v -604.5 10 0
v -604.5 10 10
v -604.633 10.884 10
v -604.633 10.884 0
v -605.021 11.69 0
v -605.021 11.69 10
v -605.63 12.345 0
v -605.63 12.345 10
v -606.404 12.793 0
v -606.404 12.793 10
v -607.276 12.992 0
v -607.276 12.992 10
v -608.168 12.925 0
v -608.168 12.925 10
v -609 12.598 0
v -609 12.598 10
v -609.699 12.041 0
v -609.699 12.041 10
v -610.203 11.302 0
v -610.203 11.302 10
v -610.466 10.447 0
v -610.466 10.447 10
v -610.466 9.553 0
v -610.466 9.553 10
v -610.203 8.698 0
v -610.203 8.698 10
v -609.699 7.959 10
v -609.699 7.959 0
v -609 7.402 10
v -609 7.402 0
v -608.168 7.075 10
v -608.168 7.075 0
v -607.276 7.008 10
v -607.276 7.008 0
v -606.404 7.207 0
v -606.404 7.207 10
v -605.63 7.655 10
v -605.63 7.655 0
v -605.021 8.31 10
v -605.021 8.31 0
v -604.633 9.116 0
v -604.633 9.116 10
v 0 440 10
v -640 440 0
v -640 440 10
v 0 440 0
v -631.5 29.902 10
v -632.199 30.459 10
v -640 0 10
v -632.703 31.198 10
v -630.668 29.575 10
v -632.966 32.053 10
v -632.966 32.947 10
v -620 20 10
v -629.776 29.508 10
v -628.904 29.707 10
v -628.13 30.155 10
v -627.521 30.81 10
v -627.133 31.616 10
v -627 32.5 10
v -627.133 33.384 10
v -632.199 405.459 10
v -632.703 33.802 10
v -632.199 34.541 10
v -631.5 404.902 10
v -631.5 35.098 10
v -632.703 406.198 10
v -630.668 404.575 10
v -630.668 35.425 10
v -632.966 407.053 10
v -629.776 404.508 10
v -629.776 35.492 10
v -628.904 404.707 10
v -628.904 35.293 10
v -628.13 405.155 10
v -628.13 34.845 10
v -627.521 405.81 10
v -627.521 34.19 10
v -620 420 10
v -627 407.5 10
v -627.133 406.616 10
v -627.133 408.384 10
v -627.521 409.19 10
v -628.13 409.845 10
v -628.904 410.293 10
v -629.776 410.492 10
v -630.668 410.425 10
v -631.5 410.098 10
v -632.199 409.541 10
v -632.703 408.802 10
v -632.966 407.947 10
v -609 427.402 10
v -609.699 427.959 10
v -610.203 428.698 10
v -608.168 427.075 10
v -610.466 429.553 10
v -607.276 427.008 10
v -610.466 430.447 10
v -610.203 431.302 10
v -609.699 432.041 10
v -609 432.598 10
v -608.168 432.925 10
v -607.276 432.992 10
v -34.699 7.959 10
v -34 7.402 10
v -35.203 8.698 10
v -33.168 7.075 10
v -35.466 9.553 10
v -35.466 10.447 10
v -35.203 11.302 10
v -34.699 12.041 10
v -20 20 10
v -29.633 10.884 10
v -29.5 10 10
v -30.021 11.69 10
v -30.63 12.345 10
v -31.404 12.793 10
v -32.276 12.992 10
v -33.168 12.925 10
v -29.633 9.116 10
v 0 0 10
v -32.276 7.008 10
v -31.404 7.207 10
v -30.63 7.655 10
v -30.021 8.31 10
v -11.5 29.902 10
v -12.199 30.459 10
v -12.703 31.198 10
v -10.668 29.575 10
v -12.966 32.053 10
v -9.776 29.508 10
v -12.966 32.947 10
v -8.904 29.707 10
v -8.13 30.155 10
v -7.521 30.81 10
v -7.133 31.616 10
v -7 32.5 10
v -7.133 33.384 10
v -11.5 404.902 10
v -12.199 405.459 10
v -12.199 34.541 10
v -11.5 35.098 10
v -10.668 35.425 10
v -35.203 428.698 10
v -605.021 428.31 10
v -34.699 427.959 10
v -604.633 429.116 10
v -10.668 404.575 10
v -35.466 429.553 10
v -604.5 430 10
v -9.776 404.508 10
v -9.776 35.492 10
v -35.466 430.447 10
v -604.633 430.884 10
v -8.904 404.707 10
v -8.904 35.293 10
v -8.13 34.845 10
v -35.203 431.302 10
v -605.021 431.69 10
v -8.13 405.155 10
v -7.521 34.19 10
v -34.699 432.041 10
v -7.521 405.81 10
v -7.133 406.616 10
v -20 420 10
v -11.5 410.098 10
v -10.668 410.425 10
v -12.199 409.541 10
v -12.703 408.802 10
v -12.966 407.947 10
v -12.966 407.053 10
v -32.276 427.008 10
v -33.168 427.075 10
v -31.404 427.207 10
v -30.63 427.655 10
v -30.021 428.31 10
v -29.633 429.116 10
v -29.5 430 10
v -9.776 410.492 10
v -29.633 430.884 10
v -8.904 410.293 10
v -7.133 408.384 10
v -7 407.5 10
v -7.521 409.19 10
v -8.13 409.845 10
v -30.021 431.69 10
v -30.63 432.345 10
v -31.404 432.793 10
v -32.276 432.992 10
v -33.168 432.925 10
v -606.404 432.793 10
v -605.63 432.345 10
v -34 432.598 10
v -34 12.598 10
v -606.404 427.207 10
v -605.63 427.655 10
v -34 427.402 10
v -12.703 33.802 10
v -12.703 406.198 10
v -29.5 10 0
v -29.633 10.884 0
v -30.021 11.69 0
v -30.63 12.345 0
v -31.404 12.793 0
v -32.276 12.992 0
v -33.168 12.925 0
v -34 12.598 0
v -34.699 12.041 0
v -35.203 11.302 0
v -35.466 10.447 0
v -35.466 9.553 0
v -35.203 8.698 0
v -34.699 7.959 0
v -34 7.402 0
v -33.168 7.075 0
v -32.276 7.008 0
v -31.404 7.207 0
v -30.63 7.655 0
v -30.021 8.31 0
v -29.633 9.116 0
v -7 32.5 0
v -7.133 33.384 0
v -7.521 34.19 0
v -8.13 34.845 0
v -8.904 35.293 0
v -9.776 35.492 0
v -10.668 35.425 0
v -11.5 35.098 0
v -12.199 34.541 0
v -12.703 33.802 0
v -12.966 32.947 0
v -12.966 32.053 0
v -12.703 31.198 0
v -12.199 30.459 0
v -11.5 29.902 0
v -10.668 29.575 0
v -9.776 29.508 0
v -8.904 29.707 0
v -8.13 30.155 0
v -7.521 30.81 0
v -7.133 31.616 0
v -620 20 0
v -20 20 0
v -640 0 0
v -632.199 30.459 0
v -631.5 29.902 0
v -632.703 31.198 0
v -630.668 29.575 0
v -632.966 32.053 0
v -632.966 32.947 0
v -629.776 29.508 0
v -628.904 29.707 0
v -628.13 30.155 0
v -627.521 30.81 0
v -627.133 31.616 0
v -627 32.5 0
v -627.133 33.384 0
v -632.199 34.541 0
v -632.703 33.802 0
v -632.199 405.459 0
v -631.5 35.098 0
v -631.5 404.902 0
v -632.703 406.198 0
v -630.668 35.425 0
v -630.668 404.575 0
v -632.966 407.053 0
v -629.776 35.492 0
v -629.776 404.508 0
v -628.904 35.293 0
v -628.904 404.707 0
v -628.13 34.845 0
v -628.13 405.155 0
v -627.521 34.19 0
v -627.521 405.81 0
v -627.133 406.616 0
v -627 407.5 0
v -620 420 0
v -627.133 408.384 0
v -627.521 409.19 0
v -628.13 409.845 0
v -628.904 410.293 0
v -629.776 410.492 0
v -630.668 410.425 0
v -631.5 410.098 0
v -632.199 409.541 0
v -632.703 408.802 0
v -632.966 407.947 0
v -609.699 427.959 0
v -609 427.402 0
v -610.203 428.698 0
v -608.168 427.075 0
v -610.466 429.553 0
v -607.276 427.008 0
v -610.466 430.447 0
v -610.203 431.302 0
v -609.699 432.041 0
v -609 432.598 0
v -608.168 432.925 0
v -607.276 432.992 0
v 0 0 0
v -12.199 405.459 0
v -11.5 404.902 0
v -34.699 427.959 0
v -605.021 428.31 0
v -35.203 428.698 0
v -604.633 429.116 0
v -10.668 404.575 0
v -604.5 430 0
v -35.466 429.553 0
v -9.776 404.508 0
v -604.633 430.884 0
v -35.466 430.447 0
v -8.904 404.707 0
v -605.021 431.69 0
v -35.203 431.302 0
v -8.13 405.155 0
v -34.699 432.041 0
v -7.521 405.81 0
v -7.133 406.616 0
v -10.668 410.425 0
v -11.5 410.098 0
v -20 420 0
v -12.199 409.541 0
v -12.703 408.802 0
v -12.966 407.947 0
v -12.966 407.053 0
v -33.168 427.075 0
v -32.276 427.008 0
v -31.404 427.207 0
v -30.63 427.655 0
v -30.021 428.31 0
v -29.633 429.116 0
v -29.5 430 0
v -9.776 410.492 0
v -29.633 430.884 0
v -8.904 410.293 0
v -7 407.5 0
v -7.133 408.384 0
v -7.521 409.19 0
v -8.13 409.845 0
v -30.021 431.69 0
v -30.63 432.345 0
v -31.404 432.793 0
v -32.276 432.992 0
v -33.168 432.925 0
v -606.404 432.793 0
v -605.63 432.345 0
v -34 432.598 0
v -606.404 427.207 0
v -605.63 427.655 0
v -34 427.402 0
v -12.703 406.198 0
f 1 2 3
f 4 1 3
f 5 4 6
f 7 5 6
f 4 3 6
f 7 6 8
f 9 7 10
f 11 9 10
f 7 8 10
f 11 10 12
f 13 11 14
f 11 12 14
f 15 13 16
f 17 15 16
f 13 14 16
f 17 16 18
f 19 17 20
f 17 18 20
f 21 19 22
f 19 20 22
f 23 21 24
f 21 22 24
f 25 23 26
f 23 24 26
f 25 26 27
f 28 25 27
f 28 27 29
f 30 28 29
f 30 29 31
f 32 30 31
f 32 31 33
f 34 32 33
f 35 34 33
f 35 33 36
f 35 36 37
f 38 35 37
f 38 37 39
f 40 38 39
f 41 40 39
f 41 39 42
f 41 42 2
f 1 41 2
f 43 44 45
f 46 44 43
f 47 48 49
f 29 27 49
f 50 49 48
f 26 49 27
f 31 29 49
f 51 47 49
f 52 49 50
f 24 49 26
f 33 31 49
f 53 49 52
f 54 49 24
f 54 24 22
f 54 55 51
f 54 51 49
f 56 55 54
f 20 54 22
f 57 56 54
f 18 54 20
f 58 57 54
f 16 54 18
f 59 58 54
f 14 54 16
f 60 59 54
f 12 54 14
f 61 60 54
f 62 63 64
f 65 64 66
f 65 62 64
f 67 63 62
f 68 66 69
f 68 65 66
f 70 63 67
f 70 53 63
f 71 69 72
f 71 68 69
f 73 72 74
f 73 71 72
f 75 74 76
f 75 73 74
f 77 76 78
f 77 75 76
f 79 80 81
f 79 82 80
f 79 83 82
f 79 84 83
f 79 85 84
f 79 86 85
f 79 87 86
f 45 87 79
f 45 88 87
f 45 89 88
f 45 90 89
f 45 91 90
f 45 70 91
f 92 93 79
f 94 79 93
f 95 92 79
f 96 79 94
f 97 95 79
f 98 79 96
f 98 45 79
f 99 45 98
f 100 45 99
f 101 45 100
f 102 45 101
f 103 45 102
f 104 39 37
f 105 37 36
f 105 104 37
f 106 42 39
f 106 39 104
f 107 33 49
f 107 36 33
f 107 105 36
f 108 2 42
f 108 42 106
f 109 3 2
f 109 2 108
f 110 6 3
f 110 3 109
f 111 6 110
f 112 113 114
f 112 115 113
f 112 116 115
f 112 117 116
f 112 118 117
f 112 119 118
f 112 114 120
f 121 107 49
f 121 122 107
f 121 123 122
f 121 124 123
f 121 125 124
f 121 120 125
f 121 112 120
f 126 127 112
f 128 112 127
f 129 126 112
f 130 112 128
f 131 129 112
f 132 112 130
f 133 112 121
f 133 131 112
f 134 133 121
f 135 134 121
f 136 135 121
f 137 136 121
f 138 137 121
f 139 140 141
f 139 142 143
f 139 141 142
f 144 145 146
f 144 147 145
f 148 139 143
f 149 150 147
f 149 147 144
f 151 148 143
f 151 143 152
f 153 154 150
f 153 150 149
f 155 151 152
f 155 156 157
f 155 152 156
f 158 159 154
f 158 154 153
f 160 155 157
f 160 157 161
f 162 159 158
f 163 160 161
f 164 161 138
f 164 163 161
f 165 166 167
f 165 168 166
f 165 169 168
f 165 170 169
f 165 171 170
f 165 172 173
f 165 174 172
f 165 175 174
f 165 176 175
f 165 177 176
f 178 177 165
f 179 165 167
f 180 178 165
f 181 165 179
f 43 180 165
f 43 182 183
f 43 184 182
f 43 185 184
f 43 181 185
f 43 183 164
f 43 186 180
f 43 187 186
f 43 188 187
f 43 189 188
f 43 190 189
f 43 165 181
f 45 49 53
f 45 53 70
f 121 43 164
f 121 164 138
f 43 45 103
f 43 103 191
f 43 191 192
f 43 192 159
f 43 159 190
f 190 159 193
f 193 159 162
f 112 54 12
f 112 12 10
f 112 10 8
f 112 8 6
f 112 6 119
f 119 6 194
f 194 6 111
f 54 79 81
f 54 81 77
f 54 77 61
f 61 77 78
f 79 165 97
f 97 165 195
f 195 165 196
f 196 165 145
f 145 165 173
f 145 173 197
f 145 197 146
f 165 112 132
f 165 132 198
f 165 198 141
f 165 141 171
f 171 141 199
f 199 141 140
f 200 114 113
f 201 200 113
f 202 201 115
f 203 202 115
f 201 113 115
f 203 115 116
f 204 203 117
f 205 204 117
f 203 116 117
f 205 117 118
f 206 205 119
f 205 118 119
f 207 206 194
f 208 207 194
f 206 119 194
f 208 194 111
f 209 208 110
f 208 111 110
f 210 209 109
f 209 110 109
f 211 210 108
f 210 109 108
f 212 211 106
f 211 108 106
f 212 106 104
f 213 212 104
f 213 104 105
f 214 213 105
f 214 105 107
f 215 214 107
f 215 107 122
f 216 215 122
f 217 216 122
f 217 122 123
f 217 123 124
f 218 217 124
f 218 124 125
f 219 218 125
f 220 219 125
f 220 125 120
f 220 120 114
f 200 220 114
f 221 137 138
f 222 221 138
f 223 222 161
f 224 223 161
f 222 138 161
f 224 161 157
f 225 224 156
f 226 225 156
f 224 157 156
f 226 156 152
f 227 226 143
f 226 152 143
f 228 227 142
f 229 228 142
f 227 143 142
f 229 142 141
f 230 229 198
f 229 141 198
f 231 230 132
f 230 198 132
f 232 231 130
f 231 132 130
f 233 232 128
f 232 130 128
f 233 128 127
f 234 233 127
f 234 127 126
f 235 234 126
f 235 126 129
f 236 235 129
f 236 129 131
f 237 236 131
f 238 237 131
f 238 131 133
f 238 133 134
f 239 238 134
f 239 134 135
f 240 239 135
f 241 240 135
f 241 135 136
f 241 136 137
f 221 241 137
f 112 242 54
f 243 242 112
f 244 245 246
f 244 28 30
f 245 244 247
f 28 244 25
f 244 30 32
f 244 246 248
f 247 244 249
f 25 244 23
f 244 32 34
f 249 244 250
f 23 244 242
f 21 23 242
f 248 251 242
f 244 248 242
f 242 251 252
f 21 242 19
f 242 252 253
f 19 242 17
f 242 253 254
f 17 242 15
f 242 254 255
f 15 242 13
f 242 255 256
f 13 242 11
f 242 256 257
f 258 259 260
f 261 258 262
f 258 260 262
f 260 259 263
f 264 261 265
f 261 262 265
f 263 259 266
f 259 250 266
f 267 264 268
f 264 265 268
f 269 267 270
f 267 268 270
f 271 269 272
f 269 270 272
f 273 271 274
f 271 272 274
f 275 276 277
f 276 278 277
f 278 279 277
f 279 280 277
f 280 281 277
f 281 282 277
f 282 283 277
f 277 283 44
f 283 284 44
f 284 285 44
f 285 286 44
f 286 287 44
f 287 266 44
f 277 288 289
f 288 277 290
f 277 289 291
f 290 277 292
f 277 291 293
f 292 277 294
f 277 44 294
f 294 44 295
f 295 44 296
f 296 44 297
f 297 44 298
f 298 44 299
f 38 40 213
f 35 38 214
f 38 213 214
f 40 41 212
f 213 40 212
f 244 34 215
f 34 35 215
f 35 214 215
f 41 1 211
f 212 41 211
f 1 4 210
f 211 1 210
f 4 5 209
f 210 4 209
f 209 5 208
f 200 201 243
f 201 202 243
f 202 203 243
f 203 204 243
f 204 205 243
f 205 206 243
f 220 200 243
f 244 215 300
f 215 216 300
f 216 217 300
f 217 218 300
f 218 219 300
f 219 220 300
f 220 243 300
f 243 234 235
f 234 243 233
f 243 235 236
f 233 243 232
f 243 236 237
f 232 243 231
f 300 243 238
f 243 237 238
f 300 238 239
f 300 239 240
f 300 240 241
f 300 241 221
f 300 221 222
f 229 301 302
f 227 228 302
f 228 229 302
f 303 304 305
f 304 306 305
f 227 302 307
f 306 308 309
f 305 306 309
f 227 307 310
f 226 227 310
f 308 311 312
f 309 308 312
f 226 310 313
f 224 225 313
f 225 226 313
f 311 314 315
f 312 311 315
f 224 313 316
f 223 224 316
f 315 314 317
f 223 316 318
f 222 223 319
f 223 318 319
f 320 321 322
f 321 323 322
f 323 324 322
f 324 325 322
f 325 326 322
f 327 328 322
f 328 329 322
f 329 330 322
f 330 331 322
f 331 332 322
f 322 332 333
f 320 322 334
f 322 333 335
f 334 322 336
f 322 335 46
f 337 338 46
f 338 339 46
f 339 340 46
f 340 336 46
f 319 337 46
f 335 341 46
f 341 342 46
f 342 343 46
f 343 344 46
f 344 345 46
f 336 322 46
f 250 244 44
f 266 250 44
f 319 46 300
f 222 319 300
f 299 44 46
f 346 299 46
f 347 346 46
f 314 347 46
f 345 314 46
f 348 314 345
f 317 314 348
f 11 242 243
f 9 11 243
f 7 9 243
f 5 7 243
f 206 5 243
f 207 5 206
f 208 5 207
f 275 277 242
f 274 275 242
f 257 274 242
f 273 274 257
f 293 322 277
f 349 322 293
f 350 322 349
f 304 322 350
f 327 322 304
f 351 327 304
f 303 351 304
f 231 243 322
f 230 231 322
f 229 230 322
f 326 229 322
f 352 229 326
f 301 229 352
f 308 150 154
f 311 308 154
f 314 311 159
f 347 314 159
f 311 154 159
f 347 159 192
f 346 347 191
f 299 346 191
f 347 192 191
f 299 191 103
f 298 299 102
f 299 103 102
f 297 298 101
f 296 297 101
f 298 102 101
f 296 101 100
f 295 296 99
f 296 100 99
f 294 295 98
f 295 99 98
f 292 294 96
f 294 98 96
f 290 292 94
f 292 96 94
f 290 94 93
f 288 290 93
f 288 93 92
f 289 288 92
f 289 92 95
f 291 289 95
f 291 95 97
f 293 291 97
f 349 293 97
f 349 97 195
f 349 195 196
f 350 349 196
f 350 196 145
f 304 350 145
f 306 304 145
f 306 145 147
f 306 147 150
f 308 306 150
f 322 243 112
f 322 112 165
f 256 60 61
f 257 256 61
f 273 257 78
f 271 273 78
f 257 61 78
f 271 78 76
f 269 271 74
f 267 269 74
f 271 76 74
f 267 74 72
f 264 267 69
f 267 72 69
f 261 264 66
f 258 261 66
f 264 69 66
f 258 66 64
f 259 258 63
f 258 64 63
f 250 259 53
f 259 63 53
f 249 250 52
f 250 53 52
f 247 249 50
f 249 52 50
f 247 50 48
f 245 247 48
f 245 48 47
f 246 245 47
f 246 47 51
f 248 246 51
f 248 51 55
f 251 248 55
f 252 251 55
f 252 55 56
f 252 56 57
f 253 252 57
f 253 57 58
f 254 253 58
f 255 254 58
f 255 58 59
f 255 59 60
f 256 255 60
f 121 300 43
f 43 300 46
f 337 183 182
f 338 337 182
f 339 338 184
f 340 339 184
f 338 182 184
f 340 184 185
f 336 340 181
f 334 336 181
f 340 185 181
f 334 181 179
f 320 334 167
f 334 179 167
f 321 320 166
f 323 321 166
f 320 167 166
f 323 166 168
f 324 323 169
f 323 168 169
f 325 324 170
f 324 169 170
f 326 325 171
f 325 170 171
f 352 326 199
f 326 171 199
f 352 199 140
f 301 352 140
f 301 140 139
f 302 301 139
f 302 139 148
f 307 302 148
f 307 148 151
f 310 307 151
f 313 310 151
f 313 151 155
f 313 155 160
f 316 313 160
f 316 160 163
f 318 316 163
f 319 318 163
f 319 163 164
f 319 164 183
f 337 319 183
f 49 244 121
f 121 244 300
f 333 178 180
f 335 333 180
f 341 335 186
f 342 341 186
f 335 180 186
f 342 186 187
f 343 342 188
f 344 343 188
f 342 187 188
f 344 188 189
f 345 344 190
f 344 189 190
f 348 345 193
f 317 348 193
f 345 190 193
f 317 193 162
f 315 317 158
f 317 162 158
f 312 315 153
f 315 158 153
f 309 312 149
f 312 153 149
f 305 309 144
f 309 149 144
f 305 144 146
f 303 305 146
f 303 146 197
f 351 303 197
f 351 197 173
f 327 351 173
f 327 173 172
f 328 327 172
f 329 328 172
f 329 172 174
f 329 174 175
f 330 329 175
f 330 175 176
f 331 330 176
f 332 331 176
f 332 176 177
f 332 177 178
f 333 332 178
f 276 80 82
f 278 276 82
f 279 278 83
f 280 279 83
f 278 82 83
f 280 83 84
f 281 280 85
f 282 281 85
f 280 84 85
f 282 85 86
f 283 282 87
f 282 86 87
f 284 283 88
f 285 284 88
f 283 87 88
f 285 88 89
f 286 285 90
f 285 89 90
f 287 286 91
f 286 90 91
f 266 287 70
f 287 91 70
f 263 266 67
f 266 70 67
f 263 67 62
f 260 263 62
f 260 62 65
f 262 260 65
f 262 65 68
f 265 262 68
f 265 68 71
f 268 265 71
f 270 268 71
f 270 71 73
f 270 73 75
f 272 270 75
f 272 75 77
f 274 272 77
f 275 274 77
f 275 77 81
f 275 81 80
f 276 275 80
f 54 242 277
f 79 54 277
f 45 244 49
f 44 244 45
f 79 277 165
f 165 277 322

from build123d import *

# Parameters (mm, degrees)
ESQUISSE1_W             = 640
ESQUISSE1_H             = 440
ESQUISSE1_W_2           = 600
ESQUISSE1_H_2           = 400
BOSS_EXTRU_1_DEPTH      = 10
ESQUISSE2_R             = 3
ENL_V_MAT_EXTRU_1_DEPTH = 11


with BuildPart() as part:
    # Esquisse1 → Boss.-Extru.1 (new body)
    with BuildSketch(Plane.XY):
        with Locations((-320, 220)):
            Rectangle(ESQUISSE1_W, ESQUISSE1_H)
        with Locations((-320, 220)):
            Rectangle(ESQUISSE1_W_2, ESQUISSE1_H_2, mode=Mode.SUBTRACT)
    extrude(amount=BOSS_EXTRU_1_DEPTH)

    # Esquisse2 → Enlèv. mat.-Extru.1 (cut, through all)
    with BuildSketch(Plane.XY.offset(10)):
        with Locations((-32.5, 430)):
            Circle(ESQUISSE2_R)
        with Locations((-10, 407.5)):
            Circle(ESQUISSE2_R)
        with Locations((-607.5, 430)):
            Circle(ESQUISSE2_R)
        with Locations((-630, 407.5)):
            Circle(ESQUISSE2_R)
        with Locations((-630, 32.5)):
            Circle(ESQUISSE2_R)
        with Locations((-607.5, 10)):
            Circle(ESQUISSE2_R)
        with Locations((-32.5, 10)):
            Circle(ESQUISSE2_R)
        with Locations((-10, 32.5)):
            Circle(ESQUISSE2_R)
    extrude(amount=-ENL_V_MAT_EXTRU_1_DEPTH, mode=Mode.SUBTRACT)


solid = part.part
